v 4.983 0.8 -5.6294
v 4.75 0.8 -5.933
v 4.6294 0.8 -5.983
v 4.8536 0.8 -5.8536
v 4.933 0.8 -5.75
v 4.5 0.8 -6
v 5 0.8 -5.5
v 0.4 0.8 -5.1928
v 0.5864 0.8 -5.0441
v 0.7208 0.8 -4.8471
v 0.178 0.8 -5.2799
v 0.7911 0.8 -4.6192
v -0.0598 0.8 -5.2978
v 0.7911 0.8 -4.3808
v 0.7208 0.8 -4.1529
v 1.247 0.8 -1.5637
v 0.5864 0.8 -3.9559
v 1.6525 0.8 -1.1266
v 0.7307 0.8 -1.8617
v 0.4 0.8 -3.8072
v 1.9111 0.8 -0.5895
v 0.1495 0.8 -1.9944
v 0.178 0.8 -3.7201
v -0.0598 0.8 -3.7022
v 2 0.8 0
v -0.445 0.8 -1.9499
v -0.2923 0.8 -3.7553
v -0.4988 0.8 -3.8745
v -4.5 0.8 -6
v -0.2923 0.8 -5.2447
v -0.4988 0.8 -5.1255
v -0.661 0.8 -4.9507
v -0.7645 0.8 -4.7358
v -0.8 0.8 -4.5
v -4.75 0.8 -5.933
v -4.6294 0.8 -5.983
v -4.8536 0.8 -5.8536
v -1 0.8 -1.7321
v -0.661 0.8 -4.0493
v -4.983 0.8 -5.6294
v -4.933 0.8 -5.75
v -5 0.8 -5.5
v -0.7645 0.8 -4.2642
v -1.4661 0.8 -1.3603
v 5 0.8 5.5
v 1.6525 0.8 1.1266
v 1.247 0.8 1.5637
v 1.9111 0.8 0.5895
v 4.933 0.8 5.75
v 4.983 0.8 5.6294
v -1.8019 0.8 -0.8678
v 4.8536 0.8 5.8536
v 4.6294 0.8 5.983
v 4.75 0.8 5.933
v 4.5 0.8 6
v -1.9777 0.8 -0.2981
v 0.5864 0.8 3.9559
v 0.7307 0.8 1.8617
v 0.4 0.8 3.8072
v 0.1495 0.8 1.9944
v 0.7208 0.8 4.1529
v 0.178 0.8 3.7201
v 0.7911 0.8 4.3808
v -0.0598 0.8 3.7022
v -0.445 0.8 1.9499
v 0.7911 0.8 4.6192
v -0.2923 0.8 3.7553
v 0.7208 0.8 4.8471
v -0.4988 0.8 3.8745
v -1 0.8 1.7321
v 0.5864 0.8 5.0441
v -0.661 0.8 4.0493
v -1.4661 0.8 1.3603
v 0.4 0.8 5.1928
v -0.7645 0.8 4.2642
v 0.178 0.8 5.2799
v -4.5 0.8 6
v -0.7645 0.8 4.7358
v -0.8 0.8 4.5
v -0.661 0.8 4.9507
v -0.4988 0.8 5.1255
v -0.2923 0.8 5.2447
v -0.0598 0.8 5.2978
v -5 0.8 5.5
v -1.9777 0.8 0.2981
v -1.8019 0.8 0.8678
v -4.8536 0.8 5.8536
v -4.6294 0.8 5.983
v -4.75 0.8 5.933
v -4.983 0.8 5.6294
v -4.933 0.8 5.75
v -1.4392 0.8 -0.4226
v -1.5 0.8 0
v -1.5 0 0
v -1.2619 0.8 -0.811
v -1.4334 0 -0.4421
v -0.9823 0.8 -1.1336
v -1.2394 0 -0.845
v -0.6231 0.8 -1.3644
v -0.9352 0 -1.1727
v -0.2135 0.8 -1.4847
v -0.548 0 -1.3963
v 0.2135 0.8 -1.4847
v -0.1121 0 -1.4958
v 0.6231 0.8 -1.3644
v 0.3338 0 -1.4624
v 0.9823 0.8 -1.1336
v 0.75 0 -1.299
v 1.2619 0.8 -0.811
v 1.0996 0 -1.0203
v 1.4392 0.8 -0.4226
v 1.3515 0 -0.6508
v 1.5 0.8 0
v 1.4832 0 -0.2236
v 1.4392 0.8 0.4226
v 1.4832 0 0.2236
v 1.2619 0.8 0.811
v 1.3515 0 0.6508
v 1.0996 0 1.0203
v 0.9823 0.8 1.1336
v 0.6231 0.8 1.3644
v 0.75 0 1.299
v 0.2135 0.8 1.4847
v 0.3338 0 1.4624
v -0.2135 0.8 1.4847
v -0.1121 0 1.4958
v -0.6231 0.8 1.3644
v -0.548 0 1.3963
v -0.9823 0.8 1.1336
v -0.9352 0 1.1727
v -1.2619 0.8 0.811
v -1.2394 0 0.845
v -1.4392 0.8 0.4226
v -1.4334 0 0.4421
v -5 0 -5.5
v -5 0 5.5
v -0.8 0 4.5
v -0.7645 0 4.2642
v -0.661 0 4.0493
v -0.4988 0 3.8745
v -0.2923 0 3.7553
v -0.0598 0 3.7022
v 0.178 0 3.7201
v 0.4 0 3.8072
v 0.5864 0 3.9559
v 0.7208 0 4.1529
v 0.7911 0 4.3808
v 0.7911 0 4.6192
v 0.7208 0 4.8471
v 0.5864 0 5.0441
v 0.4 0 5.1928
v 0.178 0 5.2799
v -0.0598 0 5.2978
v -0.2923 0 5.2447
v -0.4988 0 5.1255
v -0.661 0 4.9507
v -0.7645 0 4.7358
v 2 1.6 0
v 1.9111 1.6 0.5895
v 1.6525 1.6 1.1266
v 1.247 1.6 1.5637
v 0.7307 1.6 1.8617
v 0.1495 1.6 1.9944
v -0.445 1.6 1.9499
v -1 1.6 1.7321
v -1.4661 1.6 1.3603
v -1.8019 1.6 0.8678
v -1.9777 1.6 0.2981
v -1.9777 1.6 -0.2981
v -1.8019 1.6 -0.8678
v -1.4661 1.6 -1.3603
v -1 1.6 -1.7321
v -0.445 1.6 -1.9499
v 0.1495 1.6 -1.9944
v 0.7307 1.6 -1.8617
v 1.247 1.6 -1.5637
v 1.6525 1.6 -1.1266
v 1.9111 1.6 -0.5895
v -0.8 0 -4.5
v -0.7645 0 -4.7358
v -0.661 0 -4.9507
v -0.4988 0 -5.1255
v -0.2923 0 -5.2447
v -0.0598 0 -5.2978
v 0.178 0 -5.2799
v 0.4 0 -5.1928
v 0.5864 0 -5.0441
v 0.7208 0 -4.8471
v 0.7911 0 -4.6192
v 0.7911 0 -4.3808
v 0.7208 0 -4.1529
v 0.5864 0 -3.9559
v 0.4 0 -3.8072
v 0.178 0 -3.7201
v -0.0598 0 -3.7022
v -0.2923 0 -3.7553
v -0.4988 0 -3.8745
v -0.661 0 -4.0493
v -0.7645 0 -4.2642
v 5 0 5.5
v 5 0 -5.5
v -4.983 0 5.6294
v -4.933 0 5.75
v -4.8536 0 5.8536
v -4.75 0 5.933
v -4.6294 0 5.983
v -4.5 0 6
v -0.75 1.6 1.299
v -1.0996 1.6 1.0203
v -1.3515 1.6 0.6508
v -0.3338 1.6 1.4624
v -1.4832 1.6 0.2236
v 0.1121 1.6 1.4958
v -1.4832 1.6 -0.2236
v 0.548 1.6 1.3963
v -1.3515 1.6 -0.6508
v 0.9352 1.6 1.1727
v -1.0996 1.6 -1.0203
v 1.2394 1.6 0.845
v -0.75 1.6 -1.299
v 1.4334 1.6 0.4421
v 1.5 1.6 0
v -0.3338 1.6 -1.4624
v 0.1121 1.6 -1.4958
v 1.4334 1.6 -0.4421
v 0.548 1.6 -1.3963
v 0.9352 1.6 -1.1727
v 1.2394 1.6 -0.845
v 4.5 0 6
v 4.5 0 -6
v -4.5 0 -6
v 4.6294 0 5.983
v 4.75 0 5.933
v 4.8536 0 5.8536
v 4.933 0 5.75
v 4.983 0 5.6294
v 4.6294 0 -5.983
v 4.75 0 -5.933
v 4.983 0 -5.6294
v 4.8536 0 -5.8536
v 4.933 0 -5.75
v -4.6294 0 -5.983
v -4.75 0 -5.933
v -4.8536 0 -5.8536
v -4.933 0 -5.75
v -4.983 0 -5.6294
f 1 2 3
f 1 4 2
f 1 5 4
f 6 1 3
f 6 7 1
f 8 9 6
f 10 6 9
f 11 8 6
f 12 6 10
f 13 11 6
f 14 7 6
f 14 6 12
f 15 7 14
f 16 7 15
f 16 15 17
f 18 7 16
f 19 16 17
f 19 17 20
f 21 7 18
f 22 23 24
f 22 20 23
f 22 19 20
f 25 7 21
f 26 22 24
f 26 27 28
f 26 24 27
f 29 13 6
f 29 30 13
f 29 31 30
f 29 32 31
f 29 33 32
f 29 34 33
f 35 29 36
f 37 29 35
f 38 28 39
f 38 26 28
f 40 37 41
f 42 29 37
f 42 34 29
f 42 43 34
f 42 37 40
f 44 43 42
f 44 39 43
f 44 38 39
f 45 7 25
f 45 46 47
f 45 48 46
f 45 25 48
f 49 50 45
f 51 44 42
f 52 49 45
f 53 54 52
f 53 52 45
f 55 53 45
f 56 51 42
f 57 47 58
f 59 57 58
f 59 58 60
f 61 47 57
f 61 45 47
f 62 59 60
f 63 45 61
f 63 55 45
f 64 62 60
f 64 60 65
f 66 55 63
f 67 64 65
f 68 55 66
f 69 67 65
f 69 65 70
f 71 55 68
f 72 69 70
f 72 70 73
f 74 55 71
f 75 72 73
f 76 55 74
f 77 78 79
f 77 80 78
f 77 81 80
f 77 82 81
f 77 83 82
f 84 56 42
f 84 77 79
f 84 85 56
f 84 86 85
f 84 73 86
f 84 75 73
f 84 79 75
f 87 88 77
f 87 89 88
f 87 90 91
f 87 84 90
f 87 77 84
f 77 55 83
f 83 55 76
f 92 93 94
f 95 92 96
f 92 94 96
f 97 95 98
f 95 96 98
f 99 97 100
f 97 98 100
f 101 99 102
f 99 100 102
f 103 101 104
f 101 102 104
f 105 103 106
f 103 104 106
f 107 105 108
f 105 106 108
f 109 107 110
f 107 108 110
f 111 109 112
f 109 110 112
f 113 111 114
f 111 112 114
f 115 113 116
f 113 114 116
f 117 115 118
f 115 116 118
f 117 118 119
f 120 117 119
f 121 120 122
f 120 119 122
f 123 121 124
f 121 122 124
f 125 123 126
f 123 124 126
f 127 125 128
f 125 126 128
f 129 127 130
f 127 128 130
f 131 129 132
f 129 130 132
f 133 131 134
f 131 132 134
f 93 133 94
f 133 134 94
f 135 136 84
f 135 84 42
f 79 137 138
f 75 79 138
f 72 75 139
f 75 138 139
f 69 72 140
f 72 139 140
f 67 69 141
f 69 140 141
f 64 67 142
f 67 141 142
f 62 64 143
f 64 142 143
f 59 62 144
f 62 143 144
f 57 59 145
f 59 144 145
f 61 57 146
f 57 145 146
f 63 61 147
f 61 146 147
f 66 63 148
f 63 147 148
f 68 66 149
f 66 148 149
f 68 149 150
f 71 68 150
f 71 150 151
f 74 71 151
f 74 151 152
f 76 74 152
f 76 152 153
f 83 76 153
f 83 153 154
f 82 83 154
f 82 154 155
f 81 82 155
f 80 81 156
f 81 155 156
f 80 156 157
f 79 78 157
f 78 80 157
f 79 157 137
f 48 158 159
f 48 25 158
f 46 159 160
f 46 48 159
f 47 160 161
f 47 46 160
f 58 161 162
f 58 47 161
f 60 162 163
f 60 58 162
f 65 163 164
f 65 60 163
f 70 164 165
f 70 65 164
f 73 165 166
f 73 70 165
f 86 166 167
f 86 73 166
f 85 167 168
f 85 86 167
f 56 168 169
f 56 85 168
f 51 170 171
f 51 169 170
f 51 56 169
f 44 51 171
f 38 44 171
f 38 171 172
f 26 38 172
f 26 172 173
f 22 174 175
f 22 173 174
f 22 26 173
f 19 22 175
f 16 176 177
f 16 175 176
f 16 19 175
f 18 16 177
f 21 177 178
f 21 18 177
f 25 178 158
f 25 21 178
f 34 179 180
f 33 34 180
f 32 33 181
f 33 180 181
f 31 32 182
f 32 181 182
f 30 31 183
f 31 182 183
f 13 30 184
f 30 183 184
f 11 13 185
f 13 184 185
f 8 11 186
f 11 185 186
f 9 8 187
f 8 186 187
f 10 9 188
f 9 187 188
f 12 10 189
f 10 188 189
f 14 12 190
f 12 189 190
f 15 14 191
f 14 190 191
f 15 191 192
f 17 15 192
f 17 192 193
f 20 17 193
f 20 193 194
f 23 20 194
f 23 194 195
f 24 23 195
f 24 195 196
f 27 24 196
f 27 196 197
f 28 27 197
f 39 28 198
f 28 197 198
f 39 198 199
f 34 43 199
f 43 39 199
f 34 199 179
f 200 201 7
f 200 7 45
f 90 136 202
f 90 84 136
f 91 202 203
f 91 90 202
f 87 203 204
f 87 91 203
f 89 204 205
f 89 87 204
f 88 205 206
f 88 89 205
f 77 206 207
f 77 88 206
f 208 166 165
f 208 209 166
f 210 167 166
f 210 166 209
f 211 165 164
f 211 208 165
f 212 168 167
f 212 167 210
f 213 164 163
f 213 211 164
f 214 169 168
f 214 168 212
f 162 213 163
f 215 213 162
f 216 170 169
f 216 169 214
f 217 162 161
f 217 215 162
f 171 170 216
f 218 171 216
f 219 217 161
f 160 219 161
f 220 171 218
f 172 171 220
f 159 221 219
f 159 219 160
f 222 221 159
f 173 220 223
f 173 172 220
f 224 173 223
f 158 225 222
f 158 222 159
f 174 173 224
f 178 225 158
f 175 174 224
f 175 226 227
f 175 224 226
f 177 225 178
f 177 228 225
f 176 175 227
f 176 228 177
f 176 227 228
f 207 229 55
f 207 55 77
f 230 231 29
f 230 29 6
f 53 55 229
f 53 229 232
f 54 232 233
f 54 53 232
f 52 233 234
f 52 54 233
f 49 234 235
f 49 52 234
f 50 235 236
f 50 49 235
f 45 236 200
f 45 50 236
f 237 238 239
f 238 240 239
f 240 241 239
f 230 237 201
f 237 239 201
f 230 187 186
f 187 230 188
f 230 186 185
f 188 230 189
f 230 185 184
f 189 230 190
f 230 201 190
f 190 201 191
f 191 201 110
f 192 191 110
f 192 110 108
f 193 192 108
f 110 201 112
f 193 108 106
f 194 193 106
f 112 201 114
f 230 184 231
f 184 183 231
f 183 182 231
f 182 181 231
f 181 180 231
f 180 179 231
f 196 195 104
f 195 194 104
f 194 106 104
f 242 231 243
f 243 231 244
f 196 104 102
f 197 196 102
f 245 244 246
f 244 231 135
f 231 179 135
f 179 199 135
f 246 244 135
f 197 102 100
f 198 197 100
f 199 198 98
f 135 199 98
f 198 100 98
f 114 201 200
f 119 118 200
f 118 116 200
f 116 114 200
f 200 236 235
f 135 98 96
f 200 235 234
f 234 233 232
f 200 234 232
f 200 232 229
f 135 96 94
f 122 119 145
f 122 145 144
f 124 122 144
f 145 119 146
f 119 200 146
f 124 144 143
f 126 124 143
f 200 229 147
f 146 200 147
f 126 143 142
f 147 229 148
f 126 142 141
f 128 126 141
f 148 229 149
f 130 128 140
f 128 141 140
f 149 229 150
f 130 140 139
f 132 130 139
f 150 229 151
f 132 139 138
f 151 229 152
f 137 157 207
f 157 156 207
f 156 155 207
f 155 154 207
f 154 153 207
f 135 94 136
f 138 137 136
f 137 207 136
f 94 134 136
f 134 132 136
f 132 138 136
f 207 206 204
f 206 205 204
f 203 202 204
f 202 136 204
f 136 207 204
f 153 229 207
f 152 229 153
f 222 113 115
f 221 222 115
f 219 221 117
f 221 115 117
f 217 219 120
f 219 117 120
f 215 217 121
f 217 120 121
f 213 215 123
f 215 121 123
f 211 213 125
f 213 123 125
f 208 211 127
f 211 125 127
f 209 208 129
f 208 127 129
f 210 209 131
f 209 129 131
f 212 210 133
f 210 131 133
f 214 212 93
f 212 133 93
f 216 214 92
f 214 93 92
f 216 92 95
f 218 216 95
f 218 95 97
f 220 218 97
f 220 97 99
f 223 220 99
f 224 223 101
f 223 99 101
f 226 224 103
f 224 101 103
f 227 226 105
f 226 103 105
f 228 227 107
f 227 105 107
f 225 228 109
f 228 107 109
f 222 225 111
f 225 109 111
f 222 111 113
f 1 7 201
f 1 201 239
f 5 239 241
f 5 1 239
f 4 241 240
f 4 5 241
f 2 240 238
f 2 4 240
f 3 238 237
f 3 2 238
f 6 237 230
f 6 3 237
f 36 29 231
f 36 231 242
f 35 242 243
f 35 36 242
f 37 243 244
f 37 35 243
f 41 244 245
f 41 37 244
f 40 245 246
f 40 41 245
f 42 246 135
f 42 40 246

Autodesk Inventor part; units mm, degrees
ref_plane "YZ Plane" through (0, 0, 0) normal (1, 0, 0) x (0, 1, 0)
ref_plane "XZ Plane" through (0, 0, 0) normal (0, 1, 0) x (-1, 0, 0)
ref_plane "XY Plane" through (0, 0, 0) normal (0, 0, 1) x (1, 0, 0)
sketch "Sketch1" plane through (0, 0, 0) normal (0, 1, 0) x (-1, 0, 0)
  line L0 (-5, 6) -> (5, 6)
  line L1 (5, 6) -> (5, -6)
  line L2 (5, -6) -> (-5, -6)
  line L3 (-5, -6) -> (-5, 6)
  line L4 (-5, 6) -> (5, -6) construction
  line L5 (5, 6) -> (-5, -6) construction
  circle A0 centre (0, 0) radius 1.5
  line L6 (5, 0) -> (-5, 0) construction
  line L7 (0, 6) -> (0, -6) construction
  circle A1 centre (0, 4.5) radius 0.8
  circle A2 centre (0, -4.5) radius 0.8
  dimension "d0" = 10
  dimension "d1" = 12
  dimension "d2" = 3
  dimension "d3" = 9
  dimension "d4" = 1.6
extrude "Extrusion1" add sketch "Sketch1" along normal blind 0.8
fillet "Fillet1" radius 0.5 4 edges at (-5, 0.4, 6) (5, 0.4, 6) (5, 0.4, -6) (-5, 0.4, -6)
sketch "Sketch2" plane through (0, 0.8, 0) normal (0, 1, 0) x (1, 0, 0)
  circle A0 centre (0, 0) radius 1.5 projected
  circle A1 centre (0, 0) radius 2
  dimension "d9" = 4
extrude "Extrusion2" add sketch "Sketch2" along normal blind 0.8
properties part number "Encoder Front Plate" material "Brass, Soft Yellow"
